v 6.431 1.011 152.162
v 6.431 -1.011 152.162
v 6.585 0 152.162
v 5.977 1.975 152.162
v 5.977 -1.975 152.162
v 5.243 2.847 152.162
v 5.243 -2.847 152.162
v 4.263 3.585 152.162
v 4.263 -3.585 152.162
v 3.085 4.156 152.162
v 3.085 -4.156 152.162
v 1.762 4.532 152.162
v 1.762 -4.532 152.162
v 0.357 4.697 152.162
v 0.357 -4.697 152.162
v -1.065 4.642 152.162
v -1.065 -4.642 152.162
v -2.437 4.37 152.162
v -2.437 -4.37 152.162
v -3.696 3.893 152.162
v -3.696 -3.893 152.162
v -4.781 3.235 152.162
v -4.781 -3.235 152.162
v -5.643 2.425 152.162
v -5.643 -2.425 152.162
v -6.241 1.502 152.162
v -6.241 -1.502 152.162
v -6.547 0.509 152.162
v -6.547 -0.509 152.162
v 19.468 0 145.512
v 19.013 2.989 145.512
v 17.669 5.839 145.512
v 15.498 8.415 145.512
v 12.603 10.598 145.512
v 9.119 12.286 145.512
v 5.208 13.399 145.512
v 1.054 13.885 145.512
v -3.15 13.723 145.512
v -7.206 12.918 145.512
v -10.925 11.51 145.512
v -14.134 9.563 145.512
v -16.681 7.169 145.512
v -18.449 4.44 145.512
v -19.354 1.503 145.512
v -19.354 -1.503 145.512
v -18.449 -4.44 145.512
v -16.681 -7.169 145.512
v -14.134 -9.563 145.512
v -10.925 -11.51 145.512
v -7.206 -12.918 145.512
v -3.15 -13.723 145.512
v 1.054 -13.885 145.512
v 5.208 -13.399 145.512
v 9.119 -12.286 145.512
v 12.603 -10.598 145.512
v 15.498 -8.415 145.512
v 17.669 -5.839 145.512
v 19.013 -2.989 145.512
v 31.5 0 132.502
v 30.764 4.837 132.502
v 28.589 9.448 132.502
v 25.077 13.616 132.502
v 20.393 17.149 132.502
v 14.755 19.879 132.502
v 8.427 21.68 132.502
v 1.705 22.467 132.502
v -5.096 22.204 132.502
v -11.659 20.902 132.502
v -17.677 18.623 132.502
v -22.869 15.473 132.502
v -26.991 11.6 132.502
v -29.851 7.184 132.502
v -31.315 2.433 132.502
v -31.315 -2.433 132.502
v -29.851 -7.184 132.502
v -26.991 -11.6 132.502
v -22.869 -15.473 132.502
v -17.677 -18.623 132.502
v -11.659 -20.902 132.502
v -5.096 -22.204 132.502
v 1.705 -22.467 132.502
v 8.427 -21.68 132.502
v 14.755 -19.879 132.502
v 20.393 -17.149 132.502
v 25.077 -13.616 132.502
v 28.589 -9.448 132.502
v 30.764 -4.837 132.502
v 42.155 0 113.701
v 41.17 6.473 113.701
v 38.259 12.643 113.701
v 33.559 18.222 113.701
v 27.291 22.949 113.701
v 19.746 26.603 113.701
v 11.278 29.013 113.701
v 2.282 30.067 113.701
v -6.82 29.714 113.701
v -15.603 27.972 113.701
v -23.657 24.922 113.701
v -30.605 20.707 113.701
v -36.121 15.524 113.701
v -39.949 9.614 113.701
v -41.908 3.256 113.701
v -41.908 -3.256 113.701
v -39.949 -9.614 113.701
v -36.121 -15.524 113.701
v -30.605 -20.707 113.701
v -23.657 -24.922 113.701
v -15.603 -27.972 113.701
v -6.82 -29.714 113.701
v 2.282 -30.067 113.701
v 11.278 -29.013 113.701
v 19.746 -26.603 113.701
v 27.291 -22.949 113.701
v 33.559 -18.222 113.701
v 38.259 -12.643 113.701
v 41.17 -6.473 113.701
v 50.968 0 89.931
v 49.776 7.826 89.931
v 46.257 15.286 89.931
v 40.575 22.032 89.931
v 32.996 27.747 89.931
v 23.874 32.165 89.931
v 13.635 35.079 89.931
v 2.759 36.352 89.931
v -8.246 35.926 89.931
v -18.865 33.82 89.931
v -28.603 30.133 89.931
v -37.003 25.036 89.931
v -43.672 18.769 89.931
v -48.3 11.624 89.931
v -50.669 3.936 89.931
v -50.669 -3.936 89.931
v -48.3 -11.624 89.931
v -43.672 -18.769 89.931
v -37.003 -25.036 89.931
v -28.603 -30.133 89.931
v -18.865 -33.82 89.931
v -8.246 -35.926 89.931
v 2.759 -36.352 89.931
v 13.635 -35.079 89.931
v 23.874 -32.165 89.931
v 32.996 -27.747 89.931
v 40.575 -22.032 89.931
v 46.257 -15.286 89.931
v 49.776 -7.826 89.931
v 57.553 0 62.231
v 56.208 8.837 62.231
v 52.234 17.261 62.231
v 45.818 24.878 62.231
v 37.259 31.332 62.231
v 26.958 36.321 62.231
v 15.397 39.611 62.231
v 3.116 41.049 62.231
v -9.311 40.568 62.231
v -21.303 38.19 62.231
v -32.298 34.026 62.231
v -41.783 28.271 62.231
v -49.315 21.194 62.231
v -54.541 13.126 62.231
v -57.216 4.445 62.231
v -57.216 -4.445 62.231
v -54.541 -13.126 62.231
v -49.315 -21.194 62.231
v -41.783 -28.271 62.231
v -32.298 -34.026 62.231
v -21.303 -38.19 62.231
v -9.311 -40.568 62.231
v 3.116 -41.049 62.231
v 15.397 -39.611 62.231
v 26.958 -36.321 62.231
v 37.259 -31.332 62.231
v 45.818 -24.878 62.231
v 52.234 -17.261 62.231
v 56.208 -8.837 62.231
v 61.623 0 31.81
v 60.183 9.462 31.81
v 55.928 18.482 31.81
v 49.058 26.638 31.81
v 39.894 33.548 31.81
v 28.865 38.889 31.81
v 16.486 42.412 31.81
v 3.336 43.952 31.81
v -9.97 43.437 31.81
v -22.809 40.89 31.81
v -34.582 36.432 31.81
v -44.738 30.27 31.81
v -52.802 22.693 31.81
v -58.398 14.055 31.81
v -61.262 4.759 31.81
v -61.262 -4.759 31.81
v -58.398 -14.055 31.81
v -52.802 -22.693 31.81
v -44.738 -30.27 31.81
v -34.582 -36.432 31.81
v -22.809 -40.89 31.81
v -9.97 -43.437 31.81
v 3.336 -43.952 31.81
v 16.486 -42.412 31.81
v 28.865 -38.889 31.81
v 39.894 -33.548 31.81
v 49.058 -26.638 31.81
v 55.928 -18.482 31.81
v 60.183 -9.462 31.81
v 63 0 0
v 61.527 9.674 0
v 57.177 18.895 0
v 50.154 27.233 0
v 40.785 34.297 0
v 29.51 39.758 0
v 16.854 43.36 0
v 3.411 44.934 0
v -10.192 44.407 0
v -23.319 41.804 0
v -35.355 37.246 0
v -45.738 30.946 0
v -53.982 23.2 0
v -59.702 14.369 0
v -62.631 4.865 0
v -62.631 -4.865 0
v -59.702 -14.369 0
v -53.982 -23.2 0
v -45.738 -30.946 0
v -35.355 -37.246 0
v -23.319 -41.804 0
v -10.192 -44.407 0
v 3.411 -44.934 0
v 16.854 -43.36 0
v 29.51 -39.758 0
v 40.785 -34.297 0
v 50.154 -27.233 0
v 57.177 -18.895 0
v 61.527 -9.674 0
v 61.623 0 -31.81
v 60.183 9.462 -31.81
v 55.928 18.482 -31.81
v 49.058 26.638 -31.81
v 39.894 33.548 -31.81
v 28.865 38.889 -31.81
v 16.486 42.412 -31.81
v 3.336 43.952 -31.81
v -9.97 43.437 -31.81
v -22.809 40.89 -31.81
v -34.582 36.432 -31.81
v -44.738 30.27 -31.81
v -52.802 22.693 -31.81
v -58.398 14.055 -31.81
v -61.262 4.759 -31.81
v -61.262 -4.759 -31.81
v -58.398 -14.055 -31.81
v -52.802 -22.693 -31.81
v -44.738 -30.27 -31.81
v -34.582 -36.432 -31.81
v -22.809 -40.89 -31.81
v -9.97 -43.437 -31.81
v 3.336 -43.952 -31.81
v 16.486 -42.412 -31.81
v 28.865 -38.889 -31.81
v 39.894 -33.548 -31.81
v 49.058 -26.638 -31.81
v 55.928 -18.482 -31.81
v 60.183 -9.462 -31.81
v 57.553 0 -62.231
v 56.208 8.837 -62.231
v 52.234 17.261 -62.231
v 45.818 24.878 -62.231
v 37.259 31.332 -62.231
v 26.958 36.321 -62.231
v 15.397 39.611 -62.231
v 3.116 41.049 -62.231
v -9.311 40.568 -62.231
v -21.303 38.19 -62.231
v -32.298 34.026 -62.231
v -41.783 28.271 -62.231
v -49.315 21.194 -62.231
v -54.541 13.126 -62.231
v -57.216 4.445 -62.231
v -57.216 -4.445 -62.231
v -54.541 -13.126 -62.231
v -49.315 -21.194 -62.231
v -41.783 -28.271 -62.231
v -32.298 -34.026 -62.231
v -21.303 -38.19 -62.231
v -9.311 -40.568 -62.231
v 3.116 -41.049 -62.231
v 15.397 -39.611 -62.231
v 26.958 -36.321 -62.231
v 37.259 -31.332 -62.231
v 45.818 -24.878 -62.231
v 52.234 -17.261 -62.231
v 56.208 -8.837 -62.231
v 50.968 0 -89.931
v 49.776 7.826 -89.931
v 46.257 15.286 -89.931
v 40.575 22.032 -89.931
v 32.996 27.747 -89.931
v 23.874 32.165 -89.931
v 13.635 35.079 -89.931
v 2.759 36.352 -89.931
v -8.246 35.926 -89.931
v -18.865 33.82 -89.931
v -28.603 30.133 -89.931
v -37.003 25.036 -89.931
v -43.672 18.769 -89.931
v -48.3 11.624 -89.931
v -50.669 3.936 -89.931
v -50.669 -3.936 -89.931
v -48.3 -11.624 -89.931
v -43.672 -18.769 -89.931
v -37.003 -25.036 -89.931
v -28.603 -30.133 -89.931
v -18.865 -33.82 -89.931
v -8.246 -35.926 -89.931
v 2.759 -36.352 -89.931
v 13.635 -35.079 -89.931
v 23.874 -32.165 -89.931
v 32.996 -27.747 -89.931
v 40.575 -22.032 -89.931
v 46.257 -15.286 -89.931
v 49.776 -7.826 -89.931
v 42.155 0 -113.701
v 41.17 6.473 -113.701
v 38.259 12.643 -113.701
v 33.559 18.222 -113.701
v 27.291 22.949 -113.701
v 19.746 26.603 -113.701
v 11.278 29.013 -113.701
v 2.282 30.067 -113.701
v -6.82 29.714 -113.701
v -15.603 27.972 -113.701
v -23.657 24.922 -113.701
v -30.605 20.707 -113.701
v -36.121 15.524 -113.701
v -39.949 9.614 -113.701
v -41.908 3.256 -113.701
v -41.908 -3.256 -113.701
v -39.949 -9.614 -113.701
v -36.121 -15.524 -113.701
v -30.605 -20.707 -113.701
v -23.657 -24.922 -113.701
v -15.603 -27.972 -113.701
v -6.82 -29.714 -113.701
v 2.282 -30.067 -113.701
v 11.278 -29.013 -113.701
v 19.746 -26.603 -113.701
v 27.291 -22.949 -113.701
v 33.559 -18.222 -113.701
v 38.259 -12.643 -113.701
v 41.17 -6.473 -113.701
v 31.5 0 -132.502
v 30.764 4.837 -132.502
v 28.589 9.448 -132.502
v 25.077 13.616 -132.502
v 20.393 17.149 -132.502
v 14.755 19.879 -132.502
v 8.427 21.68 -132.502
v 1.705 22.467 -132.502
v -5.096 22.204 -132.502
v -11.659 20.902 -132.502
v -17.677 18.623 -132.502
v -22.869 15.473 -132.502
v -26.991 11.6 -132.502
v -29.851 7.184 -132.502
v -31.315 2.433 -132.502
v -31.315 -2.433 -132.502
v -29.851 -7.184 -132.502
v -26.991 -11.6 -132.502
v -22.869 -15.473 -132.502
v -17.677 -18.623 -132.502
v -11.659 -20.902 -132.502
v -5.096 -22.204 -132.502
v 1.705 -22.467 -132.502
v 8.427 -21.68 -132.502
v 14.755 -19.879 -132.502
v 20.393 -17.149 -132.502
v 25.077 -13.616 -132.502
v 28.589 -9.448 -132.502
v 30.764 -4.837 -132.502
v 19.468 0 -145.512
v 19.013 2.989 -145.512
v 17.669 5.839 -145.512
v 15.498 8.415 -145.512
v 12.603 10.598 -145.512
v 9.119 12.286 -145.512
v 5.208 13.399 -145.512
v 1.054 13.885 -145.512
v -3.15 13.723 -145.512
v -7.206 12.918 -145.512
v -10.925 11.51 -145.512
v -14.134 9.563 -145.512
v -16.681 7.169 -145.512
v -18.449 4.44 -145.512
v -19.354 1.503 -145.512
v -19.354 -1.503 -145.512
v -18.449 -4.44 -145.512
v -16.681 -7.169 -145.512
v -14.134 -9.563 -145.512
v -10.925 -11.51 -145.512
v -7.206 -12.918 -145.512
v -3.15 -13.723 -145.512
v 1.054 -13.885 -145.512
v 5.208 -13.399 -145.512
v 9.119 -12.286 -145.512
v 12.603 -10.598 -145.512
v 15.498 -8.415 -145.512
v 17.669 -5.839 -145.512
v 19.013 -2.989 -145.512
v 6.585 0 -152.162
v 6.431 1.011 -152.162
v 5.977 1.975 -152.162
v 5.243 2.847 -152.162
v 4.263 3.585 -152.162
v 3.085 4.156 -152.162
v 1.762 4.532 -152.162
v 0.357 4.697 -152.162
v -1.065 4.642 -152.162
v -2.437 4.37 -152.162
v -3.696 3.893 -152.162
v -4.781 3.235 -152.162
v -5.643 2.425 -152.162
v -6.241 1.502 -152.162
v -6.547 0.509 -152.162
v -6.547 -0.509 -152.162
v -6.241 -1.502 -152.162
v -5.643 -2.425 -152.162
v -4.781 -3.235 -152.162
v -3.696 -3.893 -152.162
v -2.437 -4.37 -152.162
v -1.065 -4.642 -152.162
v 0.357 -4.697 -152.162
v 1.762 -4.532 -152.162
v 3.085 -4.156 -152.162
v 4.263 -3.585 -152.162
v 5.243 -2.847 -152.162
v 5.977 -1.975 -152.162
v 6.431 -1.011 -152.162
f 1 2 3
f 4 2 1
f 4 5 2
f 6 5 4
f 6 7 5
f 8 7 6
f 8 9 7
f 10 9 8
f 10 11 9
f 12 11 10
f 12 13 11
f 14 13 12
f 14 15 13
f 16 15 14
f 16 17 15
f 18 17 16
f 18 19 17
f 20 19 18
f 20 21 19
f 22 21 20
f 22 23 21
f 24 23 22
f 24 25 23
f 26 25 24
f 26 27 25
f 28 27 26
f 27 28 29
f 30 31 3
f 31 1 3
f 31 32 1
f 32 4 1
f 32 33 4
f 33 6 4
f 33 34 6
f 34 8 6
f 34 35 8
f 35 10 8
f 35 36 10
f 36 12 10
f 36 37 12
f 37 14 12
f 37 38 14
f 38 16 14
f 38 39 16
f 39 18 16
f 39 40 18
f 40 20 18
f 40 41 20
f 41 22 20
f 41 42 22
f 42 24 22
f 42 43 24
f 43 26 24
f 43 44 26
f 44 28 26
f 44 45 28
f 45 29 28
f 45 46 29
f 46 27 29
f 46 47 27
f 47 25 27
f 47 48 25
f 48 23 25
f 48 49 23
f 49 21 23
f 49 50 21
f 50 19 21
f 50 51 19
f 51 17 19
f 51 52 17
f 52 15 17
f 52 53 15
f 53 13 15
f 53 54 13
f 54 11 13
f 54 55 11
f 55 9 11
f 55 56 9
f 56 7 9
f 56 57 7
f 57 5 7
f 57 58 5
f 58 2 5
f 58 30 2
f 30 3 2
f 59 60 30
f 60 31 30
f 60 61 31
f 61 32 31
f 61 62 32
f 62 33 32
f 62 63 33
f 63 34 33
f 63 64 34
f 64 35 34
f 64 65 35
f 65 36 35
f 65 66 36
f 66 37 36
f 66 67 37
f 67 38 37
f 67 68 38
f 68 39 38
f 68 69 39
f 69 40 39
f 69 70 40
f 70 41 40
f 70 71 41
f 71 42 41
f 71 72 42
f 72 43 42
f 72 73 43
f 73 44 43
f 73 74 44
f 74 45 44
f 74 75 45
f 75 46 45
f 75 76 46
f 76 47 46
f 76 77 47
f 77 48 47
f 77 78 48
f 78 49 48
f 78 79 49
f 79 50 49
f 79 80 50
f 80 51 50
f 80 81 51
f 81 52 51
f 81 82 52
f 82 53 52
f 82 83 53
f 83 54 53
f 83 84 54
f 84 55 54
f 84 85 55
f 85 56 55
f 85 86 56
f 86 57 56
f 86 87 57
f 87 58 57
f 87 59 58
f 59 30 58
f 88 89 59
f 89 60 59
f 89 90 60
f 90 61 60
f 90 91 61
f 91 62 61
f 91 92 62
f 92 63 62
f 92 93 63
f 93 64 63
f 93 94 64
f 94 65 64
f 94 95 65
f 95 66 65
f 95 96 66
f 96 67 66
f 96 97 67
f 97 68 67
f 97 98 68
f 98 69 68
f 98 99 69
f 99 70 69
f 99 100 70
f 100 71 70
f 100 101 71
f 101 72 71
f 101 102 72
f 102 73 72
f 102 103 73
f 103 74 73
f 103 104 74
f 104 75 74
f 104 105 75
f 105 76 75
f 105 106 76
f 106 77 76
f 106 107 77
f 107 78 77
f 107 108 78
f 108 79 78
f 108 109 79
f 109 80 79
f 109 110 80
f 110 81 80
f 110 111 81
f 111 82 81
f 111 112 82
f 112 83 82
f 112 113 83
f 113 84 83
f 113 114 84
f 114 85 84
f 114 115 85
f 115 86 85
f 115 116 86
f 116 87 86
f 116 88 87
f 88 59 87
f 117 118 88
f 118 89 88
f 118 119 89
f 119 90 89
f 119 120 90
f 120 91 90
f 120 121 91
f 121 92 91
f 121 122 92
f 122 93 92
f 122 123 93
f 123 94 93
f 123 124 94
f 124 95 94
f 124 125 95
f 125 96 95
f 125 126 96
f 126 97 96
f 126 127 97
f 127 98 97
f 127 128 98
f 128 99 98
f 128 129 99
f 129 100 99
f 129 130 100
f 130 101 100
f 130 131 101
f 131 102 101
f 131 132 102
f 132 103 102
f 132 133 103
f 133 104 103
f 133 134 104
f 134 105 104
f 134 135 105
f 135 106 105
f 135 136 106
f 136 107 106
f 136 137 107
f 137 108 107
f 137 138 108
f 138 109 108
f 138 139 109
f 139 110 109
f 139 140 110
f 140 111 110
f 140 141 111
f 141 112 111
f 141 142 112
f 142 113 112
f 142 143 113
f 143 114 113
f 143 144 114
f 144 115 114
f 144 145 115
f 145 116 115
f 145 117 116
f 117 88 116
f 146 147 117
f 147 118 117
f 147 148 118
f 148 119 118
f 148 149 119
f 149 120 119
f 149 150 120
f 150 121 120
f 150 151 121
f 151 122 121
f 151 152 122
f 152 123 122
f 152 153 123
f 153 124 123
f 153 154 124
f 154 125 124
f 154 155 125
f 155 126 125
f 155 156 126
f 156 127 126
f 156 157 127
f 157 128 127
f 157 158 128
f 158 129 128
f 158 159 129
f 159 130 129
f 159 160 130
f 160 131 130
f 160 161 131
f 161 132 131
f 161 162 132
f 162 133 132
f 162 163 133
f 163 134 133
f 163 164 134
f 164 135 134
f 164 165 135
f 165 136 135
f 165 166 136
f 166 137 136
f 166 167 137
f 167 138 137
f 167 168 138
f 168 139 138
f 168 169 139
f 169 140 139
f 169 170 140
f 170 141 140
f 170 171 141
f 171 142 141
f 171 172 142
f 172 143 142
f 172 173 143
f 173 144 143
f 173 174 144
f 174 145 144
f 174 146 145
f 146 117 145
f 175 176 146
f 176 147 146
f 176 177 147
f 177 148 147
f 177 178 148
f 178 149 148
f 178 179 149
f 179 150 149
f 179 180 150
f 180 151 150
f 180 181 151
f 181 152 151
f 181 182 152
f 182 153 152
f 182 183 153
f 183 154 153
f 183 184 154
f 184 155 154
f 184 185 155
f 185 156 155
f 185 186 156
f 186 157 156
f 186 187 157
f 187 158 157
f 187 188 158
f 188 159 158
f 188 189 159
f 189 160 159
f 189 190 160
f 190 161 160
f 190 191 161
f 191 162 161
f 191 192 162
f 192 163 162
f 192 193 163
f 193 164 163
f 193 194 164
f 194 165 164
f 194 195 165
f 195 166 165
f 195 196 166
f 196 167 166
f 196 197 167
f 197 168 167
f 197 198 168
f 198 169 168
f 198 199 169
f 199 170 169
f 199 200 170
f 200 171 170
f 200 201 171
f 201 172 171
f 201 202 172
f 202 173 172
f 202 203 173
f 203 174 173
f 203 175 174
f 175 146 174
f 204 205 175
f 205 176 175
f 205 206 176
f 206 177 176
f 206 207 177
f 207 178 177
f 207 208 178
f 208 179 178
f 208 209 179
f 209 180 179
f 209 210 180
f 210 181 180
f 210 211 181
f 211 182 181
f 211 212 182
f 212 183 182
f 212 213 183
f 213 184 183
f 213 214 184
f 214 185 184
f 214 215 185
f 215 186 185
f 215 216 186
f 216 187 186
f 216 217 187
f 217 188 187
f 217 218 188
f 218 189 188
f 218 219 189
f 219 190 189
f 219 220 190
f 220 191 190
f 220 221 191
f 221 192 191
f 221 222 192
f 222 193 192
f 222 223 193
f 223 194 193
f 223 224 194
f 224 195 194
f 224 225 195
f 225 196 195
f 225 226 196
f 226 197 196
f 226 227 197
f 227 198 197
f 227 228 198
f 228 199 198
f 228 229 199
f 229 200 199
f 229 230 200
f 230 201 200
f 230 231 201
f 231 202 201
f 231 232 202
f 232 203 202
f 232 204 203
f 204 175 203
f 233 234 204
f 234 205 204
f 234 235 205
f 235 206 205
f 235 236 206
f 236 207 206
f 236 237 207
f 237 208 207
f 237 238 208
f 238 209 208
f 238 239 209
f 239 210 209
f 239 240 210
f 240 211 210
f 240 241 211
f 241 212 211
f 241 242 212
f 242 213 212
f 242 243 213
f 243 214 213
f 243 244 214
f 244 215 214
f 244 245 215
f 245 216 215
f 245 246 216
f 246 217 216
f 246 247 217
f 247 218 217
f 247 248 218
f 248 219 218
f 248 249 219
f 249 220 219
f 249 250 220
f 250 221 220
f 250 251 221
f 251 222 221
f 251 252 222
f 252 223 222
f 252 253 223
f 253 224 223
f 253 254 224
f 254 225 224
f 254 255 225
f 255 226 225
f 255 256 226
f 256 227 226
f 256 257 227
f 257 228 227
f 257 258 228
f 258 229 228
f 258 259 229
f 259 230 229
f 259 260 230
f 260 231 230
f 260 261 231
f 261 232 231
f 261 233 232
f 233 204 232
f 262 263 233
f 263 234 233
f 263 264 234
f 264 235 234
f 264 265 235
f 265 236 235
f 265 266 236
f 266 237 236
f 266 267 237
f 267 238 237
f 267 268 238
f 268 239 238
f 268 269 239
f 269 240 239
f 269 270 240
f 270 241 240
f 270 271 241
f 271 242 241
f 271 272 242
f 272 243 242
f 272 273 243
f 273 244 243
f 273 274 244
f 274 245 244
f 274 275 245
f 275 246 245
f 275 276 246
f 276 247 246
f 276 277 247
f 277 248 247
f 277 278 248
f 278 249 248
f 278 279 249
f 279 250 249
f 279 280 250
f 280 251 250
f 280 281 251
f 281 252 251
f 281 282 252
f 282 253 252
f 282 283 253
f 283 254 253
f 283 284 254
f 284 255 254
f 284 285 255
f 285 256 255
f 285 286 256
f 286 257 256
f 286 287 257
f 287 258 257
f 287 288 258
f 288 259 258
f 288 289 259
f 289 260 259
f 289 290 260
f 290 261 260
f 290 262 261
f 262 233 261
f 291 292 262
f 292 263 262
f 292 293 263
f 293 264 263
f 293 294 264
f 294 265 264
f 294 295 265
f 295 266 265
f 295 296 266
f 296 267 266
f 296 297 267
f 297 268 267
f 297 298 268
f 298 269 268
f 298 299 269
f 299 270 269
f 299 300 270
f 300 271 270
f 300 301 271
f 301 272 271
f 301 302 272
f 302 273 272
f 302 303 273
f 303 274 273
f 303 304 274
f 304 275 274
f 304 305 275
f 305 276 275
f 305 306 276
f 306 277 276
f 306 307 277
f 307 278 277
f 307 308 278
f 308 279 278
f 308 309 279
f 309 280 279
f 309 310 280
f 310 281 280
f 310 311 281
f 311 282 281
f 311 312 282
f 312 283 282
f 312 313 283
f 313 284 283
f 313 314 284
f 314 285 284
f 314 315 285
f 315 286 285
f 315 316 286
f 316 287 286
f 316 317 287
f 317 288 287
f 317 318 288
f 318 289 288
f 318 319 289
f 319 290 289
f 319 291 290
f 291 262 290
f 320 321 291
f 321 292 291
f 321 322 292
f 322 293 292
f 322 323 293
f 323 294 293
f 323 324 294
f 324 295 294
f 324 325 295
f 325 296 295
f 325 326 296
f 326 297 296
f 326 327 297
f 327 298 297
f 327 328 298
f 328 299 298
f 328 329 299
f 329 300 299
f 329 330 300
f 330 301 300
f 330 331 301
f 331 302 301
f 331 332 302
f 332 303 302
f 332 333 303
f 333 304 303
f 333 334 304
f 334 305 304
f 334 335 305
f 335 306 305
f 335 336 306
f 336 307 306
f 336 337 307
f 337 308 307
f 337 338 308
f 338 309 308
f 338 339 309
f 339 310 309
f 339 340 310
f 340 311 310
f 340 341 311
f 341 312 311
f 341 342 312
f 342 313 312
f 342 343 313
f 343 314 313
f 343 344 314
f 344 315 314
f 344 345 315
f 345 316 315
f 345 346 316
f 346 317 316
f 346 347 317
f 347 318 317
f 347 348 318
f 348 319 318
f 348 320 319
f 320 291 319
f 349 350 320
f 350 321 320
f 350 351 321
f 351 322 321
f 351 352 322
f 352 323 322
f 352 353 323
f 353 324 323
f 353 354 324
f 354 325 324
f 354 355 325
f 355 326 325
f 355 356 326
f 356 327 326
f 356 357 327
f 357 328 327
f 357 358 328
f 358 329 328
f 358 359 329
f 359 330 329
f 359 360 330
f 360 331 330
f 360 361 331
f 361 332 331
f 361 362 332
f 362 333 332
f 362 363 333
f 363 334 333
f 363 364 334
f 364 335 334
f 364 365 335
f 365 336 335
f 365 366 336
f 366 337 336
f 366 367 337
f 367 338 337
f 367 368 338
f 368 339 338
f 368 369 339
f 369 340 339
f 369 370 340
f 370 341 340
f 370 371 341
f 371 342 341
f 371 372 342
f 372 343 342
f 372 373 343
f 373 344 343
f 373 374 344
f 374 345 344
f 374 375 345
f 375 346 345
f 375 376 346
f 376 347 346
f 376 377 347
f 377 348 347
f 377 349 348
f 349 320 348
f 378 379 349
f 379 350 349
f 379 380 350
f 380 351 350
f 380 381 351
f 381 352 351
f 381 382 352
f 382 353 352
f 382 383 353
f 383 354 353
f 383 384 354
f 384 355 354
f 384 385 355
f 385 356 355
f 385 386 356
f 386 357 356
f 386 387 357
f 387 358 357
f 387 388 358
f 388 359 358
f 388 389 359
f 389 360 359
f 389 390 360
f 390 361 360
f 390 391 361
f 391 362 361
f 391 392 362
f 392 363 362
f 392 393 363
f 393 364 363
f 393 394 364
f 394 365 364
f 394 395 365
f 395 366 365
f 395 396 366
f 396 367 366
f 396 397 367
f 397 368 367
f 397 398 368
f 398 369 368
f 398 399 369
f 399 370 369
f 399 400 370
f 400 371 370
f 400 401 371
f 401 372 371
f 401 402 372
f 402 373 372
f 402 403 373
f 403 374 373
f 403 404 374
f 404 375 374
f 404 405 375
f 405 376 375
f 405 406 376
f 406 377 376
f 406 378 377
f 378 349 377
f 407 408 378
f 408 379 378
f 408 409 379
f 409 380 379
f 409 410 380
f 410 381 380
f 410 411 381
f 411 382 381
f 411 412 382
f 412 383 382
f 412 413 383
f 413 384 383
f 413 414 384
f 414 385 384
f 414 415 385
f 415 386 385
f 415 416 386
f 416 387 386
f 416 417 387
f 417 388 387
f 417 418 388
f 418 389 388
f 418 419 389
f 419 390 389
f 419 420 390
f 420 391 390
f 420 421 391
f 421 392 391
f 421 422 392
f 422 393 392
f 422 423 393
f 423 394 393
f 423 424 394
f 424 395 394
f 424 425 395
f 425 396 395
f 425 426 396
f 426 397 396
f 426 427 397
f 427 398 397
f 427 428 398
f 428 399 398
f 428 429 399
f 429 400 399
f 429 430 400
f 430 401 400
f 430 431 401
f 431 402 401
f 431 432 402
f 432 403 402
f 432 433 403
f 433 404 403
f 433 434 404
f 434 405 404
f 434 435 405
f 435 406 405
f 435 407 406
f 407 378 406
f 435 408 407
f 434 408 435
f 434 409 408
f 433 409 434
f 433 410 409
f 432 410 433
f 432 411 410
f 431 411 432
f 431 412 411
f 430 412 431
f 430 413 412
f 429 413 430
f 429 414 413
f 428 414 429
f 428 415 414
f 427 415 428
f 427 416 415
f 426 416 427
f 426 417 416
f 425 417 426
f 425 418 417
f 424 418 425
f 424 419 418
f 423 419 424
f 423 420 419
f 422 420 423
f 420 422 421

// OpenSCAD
// Generated by SolidPython 1.0.1 on 2020-07-29 00:46:47


scale(v = [7, 5, 17]) {
	sphere(r = 9);
}
/***********************************************
*********      SolidPython code:      **********
************************************************
 
# import packages: SolidPython
from solid import *
from solid.utils import *
from itertools import chain, combinations, permutations


class Resize:

    def __init__(self, scad_file):
        self.scad_file = scad_file
        #self.scad_file = import_scad(scad_file)
        # cone/cylinder param:
        self.r1 = 0
        self.r2 = 0
        self.h = 0
        # rectangular prism param:
        self.w = 0
        self.l = 0
        # ellipse param:
        self.r = 0

    # import OpenScad code (file name corresponds to shape)


    # classify shape + parameters
    def assign(self, param1, param2, param3):
        if self.scad_file == 'cone.scad':
            self.r1 = param1
            self.r2 = param2
            self.h = param3
        elif self.scad_file == 'cylinder.scad':
            self.r1 = param1
            self.r2 = param2
            self.h = param3
        elif self.scad_file == 'rectangularPrism.scad':
            self.h = param1
            self.l = param2
            self.w = param3
        else:
            self.r = param1
            self.h = param2

    # resize parameters
    def iterate(self):
        x = range(3, 20, 2)
        i = 1
        if self.scad_file == 'cone.scad':
            tempList = list(permutations(x, 2))
            for temp in tempList:
                param1 = temp[0]
                param2 = temp[1]
                filepath = 'produced_scad_files/' + 'cone' + str(param1) + '_' + str(param2) + '_' + '.scad'
                scad_render_to_file(cylinder(h=param1, r1=param2, r2=0), filepath)

        elif self.scad_file == 'cylinder.scad':
            tempList = list(permutations(x, 3))
            for temp in tempList:
                param1 = temp[0]
                param2 = temp[1]
                filepath = 'produced_scad_files/' + 'cylinder' + str(param1) + '_' + str(param2) + '_' + '.scad'
                scad_render_to_file(cylinder(h=param1, r1=param2, r2=param2), filepath)

        elif self.scad_file == 'rectangularPrism.scad':
            tempList = list(permutations(x, 3))
            for temp in tempList:
                param1 = temp[0]
                param2 = temp[1]
                param3 = temp[2]
                filepath = 'produced_scad_files/' + 'rectangularPrism' + str(param1) + '_' + str(param2) + '_' + str(
                    param3) + '.scad'
                scad_render_to_file(cube(size=(param1, param2, param3)), filepath)

        elif self.scad_file == 'ellipse.scad':
            tempList = list(permutations(x, 4))
            for temp in tempList:
                param1 = temp[0]
                param2 = temp[1]
                param3 = temp[2]
                param4 = temp[3]
                filepath = 'produced_scad_files/' + 'ellipse' + str(param1) + '_' + str(param2) + '_' + str(param3) + '_' + str(param4) + '.scad'
                scad_render_to_file(scale([param1, param2, param3])(sphere(r=param4)), filepath)

    def render_to_scadfile(self):
        scad_render_to_file(scad, 'example.scad') 
 
************************************************/
